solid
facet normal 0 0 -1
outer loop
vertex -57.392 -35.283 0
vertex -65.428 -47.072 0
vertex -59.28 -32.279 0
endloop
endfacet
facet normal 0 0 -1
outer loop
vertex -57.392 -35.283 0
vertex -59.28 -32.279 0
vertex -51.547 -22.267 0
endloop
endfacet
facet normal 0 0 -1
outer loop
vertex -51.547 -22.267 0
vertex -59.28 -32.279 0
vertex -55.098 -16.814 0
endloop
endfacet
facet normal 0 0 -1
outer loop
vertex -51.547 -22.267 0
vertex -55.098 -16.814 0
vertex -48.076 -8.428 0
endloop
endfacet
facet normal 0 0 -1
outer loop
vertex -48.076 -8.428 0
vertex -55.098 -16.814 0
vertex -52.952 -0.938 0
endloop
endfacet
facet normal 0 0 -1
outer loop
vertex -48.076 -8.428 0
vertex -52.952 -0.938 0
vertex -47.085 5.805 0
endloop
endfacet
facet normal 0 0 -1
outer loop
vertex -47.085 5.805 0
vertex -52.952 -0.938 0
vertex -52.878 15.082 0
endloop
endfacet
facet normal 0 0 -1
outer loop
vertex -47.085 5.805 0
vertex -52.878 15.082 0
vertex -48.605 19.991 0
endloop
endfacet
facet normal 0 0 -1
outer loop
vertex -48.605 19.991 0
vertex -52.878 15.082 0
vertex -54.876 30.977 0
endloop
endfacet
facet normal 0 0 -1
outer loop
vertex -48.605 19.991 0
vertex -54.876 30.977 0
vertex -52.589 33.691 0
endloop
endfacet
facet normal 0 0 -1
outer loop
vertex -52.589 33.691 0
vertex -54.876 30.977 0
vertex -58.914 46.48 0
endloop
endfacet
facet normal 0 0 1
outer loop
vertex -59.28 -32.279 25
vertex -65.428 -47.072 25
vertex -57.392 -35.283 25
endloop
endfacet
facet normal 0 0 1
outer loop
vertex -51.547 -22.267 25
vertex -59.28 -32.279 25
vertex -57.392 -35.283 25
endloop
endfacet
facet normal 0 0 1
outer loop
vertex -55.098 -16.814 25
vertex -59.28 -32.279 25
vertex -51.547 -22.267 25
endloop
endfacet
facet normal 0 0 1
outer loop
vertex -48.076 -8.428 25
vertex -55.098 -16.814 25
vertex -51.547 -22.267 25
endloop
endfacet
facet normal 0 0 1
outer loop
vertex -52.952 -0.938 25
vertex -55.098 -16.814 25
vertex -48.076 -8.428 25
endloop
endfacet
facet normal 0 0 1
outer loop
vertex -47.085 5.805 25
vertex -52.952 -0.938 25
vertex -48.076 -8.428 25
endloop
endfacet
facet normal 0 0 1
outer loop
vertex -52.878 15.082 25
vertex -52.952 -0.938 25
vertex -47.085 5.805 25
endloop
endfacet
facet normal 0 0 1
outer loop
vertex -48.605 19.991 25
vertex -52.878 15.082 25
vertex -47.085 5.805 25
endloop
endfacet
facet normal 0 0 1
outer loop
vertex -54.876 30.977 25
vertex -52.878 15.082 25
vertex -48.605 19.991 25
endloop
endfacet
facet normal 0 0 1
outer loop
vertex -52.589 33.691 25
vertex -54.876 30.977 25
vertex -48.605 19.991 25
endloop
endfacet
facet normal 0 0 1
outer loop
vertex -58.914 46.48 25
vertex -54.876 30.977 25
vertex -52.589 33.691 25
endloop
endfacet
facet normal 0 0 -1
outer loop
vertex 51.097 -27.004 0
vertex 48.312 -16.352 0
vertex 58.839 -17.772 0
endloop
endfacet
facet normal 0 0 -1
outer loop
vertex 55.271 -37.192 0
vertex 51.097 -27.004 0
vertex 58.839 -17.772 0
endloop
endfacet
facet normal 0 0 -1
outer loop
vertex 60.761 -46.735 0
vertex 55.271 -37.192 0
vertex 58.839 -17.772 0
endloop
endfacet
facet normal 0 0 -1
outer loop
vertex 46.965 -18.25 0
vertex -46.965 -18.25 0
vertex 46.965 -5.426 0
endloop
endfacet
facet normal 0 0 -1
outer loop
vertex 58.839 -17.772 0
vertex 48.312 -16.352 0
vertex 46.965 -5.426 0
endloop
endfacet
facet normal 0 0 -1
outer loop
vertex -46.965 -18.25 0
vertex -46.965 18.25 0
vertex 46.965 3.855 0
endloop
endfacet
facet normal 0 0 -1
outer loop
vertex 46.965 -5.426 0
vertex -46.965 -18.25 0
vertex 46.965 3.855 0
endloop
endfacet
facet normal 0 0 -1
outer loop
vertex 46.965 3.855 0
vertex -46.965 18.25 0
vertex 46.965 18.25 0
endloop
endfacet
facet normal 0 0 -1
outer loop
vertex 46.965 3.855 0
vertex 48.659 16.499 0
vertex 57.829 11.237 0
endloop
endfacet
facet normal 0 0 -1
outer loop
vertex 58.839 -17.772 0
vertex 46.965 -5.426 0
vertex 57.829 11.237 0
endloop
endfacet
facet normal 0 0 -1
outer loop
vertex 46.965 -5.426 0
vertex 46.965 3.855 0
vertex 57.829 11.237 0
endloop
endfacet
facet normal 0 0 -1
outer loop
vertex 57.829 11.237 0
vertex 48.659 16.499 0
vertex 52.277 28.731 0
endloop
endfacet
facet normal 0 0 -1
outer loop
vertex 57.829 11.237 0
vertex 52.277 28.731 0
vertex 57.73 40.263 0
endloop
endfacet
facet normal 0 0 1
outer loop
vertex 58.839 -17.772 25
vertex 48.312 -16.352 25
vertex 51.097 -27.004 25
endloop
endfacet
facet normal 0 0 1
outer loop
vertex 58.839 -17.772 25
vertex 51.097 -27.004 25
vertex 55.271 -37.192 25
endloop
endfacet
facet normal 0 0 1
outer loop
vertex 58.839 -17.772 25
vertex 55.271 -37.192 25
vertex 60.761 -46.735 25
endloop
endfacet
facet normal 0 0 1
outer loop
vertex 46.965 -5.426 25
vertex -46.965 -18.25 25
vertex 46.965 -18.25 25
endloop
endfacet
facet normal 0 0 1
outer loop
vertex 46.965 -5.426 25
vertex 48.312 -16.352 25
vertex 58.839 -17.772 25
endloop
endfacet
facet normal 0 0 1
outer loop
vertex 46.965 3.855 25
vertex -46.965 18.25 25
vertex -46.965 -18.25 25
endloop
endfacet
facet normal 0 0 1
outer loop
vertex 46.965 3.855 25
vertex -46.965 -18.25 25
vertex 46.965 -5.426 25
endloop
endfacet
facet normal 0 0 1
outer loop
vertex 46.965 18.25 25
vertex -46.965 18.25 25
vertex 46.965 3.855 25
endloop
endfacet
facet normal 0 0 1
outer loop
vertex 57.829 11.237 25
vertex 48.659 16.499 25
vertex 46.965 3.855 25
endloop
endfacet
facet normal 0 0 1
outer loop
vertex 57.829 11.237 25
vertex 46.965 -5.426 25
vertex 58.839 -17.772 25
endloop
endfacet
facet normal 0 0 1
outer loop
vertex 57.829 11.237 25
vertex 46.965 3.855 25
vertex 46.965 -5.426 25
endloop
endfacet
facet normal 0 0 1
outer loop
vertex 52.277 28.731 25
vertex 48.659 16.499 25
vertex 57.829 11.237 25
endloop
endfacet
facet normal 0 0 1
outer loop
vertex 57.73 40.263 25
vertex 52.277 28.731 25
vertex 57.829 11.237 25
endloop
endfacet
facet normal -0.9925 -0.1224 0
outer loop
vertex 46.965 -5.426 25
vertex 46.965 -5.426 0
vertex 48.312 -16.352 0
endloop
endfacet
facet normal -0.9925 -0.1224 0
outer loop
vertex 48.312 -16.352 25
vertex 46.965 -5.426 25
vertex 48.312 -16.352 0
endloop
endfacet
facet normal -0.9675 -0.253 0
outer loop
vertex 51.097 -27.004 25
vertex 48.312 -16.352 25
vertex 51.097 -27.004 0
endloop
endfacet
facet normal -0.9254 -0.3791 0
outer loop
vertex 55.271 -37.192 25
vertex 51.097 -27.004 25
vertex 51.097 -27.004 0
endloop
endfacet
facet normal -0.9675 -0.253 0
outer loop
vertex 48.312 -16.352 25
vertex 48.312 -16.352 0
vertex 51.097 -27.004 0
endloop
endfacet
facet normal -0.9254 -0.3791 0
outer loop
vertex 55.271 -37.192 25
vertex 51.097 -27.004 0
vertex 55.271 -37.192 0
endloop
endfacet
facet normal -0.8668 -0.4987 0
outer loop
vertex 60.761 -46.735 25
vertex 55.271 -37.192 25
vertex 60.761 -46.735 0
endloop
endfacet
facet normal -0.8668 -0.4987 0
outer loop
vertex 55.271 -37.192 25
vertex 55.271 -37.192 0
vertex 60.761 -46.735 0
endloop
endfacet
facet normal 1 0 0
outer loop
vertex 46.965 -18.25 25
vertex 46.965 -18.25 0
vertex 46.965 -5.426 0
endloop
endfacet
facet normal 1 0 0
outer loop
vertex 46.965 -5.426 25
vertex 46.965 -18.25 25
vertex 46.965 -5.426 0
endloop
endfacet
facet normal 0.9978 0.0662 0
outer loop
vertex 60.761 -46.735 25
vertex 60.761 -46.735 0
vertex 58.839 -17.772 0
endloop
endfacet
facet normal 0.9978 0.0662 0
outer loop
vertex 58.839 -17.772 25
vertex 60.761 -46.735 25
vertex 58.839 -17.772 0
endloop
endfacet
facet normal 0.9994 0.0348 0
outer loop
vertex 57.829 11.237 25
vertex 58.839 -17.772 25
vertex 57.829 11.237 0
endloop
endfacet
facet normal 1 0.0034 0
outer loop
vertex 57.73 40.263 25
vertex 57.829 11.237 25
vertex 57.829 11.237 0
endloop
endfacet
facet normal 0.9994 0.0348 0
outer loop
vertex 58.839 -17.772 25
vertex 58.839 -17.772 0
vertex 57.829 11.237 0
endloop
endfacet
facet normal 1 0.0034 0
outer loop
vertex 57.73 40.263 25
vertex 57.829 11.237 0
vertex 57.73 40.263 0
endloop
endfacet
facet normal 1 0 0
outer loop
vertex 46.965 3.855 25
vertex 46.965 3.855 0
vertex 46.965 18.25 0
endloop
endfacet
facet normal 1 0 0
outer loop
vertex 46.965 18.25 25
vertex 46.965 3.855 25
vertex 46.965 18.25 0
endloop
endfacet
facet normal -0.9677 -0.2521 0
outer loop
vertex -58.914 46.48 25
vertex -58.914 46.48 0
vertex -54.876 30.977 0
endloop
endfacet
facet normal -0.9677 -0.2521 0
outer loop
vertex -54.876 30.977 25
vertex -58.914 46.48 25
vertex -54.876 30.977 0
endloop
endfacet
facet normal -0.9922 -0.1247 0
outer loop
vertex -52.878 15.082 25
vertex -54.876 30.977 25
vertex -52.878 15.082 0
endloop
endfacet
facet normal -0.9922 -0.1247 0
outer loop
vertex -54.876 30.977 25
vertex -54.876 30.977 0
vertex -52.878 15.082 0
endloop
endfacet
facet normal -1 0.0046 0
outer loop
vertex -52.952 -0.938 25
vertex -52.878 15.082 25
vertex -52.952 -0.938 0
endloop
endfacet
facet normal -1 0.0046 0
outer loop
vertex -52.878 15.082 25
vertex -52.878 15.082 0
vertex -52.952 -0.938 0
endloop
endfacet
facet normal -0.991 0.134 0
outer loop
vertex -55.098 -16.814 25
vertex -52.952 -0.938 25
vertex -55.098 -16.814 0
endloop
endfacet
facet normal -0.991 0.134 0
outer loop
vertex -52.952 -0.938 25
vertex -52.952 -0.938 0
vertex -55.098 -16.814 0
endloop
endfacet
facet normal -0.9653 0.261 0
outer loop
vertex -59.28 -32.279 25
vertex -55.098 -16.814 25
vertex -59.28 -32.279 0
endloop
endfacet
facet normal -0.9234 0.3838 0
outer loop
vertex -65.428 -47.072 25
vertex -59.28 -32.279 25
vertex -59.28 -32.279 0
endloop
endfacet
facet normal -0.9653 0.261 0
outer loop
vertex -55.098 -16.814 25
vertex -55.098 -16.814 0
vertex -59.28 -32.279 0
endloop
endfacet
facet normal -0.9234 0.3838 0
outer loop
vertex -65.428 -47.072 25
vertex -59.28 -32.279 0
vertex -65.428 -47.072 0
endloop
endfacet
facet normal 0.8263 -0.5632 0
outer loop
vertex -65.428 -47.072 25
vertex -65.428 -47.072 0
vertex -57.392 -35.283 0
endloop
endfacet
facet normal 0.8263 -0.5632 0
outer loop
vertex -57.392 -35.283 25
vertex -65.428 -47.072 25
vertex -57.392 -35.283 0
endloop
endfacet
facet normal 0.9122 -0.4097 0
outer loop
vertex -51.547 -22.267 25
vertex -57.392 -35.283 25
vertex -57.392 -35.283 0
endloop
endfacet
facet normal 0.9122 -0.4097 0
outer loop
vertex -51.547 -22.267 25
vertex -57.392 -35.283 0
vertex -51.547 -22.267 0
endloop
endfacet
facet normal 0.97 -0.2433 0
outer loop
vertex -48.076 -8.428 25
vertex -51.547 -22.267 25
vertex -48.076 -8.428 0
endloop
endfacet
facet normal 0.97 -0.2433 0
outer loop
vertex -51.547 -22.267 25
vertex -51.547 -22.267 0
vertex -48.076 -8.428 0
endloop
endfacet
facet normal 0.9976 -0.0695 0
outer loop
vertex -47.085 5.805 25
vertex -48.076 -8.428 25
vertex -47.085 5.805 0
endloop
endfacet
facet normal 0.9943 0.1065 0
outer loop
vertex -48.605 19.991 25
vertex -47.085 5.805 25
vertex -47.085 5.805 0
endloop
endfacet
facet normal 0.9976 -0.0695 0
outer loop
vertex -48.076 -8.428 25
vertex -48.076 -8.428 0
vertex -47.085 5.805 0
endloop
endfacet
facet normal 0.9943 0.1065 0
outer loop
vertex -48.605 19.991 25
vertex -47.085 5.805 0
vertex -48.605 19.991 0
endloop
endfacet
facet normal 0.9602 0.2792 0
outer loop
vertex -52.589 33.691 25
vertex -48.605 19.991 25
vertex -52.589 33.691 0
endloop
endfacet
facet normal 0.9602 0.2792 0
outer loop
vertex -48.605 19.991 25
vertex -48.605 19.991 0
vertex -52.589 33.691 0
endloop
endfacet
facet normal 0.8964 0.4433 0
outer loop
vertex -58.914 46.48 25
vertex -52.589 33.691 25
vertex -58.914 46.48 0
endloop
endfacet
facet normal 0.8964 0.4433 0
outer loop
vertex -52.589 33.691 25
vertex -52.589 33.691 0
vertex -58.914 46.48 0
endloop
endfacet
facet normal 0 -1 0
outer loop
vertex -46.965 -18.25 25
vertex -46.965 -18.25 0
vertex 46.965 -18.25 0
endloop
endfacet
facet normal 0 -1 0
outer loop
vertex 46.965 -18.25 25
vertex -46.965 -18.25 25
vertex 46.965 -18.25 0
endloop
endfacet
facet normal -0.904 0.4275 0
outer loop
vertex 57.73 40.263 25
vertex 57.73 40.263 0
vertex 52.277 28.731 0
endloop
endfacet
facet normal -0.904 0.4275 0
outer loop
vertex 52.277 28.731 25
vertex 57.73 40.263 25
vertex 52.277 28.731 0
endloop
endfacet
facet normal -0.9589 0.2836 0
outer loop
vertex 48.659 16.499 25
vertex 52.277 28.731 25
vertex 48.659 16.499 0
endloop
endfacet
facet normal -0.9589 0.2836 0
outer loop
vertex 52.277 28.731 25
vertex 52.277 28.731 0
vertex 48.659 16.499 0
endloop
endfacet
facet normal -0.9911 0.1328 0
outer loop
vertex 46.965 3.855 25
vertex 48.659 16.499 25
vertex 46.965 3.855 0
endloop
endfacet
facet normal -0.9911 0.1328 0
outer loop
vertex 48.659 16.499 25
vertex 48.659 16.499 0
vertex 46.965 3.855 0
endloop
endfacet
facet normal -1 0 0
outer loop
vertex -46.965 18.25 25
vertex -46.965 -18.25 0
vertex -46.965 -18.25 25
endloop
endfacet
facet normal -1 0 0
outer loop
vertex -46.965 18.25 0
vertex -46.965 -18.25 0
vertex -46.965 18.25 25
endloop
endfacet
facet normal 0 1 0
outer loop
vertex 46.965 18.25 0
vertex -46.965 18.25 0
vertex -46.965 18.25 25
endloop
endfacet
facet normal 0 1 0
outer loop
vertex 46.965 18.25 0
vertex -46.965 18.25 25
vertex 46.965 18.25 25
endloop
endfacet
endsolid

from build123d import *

# Parameters (mm, degrees)
F2_DEPTH = 25
F0_W     = 93.93
F0_H     = 36.5
F3_DEPTH = 25


with BuildPart() as f2:
    # F1 (on Top) → F2 (new body)
    with BuildSketch(Plane.XY):
        with BuildLine():
            ThreePointArc((-58.914475, 46.480265), (-52.952149, -0.937875), (-65.427631, -47.07237))
            ThreePointArc((-65.427631, -47.07237), (-47.266503, -1.333711), (-58.914475, 46.480265))
        make_face()
        with BuildLine():
            ThreePointArc((60.760615, -46.735203), (58.220086, -3.271736), (57.730261, 40.263161))
            ThreePointArc((57.730261, 40.263161), (46.884992, -3.666564), (60.760615, -46.735203))
        make_face()
    extrude(amount=F2_DEPTH)

    # F0 (on Top) → F3 (join)
    with BuildSketch(Plane.XY):
        Rectangle(F0_W, F0_H)
    extrude(amount=F3_DEPTH)


solid = f2.part
